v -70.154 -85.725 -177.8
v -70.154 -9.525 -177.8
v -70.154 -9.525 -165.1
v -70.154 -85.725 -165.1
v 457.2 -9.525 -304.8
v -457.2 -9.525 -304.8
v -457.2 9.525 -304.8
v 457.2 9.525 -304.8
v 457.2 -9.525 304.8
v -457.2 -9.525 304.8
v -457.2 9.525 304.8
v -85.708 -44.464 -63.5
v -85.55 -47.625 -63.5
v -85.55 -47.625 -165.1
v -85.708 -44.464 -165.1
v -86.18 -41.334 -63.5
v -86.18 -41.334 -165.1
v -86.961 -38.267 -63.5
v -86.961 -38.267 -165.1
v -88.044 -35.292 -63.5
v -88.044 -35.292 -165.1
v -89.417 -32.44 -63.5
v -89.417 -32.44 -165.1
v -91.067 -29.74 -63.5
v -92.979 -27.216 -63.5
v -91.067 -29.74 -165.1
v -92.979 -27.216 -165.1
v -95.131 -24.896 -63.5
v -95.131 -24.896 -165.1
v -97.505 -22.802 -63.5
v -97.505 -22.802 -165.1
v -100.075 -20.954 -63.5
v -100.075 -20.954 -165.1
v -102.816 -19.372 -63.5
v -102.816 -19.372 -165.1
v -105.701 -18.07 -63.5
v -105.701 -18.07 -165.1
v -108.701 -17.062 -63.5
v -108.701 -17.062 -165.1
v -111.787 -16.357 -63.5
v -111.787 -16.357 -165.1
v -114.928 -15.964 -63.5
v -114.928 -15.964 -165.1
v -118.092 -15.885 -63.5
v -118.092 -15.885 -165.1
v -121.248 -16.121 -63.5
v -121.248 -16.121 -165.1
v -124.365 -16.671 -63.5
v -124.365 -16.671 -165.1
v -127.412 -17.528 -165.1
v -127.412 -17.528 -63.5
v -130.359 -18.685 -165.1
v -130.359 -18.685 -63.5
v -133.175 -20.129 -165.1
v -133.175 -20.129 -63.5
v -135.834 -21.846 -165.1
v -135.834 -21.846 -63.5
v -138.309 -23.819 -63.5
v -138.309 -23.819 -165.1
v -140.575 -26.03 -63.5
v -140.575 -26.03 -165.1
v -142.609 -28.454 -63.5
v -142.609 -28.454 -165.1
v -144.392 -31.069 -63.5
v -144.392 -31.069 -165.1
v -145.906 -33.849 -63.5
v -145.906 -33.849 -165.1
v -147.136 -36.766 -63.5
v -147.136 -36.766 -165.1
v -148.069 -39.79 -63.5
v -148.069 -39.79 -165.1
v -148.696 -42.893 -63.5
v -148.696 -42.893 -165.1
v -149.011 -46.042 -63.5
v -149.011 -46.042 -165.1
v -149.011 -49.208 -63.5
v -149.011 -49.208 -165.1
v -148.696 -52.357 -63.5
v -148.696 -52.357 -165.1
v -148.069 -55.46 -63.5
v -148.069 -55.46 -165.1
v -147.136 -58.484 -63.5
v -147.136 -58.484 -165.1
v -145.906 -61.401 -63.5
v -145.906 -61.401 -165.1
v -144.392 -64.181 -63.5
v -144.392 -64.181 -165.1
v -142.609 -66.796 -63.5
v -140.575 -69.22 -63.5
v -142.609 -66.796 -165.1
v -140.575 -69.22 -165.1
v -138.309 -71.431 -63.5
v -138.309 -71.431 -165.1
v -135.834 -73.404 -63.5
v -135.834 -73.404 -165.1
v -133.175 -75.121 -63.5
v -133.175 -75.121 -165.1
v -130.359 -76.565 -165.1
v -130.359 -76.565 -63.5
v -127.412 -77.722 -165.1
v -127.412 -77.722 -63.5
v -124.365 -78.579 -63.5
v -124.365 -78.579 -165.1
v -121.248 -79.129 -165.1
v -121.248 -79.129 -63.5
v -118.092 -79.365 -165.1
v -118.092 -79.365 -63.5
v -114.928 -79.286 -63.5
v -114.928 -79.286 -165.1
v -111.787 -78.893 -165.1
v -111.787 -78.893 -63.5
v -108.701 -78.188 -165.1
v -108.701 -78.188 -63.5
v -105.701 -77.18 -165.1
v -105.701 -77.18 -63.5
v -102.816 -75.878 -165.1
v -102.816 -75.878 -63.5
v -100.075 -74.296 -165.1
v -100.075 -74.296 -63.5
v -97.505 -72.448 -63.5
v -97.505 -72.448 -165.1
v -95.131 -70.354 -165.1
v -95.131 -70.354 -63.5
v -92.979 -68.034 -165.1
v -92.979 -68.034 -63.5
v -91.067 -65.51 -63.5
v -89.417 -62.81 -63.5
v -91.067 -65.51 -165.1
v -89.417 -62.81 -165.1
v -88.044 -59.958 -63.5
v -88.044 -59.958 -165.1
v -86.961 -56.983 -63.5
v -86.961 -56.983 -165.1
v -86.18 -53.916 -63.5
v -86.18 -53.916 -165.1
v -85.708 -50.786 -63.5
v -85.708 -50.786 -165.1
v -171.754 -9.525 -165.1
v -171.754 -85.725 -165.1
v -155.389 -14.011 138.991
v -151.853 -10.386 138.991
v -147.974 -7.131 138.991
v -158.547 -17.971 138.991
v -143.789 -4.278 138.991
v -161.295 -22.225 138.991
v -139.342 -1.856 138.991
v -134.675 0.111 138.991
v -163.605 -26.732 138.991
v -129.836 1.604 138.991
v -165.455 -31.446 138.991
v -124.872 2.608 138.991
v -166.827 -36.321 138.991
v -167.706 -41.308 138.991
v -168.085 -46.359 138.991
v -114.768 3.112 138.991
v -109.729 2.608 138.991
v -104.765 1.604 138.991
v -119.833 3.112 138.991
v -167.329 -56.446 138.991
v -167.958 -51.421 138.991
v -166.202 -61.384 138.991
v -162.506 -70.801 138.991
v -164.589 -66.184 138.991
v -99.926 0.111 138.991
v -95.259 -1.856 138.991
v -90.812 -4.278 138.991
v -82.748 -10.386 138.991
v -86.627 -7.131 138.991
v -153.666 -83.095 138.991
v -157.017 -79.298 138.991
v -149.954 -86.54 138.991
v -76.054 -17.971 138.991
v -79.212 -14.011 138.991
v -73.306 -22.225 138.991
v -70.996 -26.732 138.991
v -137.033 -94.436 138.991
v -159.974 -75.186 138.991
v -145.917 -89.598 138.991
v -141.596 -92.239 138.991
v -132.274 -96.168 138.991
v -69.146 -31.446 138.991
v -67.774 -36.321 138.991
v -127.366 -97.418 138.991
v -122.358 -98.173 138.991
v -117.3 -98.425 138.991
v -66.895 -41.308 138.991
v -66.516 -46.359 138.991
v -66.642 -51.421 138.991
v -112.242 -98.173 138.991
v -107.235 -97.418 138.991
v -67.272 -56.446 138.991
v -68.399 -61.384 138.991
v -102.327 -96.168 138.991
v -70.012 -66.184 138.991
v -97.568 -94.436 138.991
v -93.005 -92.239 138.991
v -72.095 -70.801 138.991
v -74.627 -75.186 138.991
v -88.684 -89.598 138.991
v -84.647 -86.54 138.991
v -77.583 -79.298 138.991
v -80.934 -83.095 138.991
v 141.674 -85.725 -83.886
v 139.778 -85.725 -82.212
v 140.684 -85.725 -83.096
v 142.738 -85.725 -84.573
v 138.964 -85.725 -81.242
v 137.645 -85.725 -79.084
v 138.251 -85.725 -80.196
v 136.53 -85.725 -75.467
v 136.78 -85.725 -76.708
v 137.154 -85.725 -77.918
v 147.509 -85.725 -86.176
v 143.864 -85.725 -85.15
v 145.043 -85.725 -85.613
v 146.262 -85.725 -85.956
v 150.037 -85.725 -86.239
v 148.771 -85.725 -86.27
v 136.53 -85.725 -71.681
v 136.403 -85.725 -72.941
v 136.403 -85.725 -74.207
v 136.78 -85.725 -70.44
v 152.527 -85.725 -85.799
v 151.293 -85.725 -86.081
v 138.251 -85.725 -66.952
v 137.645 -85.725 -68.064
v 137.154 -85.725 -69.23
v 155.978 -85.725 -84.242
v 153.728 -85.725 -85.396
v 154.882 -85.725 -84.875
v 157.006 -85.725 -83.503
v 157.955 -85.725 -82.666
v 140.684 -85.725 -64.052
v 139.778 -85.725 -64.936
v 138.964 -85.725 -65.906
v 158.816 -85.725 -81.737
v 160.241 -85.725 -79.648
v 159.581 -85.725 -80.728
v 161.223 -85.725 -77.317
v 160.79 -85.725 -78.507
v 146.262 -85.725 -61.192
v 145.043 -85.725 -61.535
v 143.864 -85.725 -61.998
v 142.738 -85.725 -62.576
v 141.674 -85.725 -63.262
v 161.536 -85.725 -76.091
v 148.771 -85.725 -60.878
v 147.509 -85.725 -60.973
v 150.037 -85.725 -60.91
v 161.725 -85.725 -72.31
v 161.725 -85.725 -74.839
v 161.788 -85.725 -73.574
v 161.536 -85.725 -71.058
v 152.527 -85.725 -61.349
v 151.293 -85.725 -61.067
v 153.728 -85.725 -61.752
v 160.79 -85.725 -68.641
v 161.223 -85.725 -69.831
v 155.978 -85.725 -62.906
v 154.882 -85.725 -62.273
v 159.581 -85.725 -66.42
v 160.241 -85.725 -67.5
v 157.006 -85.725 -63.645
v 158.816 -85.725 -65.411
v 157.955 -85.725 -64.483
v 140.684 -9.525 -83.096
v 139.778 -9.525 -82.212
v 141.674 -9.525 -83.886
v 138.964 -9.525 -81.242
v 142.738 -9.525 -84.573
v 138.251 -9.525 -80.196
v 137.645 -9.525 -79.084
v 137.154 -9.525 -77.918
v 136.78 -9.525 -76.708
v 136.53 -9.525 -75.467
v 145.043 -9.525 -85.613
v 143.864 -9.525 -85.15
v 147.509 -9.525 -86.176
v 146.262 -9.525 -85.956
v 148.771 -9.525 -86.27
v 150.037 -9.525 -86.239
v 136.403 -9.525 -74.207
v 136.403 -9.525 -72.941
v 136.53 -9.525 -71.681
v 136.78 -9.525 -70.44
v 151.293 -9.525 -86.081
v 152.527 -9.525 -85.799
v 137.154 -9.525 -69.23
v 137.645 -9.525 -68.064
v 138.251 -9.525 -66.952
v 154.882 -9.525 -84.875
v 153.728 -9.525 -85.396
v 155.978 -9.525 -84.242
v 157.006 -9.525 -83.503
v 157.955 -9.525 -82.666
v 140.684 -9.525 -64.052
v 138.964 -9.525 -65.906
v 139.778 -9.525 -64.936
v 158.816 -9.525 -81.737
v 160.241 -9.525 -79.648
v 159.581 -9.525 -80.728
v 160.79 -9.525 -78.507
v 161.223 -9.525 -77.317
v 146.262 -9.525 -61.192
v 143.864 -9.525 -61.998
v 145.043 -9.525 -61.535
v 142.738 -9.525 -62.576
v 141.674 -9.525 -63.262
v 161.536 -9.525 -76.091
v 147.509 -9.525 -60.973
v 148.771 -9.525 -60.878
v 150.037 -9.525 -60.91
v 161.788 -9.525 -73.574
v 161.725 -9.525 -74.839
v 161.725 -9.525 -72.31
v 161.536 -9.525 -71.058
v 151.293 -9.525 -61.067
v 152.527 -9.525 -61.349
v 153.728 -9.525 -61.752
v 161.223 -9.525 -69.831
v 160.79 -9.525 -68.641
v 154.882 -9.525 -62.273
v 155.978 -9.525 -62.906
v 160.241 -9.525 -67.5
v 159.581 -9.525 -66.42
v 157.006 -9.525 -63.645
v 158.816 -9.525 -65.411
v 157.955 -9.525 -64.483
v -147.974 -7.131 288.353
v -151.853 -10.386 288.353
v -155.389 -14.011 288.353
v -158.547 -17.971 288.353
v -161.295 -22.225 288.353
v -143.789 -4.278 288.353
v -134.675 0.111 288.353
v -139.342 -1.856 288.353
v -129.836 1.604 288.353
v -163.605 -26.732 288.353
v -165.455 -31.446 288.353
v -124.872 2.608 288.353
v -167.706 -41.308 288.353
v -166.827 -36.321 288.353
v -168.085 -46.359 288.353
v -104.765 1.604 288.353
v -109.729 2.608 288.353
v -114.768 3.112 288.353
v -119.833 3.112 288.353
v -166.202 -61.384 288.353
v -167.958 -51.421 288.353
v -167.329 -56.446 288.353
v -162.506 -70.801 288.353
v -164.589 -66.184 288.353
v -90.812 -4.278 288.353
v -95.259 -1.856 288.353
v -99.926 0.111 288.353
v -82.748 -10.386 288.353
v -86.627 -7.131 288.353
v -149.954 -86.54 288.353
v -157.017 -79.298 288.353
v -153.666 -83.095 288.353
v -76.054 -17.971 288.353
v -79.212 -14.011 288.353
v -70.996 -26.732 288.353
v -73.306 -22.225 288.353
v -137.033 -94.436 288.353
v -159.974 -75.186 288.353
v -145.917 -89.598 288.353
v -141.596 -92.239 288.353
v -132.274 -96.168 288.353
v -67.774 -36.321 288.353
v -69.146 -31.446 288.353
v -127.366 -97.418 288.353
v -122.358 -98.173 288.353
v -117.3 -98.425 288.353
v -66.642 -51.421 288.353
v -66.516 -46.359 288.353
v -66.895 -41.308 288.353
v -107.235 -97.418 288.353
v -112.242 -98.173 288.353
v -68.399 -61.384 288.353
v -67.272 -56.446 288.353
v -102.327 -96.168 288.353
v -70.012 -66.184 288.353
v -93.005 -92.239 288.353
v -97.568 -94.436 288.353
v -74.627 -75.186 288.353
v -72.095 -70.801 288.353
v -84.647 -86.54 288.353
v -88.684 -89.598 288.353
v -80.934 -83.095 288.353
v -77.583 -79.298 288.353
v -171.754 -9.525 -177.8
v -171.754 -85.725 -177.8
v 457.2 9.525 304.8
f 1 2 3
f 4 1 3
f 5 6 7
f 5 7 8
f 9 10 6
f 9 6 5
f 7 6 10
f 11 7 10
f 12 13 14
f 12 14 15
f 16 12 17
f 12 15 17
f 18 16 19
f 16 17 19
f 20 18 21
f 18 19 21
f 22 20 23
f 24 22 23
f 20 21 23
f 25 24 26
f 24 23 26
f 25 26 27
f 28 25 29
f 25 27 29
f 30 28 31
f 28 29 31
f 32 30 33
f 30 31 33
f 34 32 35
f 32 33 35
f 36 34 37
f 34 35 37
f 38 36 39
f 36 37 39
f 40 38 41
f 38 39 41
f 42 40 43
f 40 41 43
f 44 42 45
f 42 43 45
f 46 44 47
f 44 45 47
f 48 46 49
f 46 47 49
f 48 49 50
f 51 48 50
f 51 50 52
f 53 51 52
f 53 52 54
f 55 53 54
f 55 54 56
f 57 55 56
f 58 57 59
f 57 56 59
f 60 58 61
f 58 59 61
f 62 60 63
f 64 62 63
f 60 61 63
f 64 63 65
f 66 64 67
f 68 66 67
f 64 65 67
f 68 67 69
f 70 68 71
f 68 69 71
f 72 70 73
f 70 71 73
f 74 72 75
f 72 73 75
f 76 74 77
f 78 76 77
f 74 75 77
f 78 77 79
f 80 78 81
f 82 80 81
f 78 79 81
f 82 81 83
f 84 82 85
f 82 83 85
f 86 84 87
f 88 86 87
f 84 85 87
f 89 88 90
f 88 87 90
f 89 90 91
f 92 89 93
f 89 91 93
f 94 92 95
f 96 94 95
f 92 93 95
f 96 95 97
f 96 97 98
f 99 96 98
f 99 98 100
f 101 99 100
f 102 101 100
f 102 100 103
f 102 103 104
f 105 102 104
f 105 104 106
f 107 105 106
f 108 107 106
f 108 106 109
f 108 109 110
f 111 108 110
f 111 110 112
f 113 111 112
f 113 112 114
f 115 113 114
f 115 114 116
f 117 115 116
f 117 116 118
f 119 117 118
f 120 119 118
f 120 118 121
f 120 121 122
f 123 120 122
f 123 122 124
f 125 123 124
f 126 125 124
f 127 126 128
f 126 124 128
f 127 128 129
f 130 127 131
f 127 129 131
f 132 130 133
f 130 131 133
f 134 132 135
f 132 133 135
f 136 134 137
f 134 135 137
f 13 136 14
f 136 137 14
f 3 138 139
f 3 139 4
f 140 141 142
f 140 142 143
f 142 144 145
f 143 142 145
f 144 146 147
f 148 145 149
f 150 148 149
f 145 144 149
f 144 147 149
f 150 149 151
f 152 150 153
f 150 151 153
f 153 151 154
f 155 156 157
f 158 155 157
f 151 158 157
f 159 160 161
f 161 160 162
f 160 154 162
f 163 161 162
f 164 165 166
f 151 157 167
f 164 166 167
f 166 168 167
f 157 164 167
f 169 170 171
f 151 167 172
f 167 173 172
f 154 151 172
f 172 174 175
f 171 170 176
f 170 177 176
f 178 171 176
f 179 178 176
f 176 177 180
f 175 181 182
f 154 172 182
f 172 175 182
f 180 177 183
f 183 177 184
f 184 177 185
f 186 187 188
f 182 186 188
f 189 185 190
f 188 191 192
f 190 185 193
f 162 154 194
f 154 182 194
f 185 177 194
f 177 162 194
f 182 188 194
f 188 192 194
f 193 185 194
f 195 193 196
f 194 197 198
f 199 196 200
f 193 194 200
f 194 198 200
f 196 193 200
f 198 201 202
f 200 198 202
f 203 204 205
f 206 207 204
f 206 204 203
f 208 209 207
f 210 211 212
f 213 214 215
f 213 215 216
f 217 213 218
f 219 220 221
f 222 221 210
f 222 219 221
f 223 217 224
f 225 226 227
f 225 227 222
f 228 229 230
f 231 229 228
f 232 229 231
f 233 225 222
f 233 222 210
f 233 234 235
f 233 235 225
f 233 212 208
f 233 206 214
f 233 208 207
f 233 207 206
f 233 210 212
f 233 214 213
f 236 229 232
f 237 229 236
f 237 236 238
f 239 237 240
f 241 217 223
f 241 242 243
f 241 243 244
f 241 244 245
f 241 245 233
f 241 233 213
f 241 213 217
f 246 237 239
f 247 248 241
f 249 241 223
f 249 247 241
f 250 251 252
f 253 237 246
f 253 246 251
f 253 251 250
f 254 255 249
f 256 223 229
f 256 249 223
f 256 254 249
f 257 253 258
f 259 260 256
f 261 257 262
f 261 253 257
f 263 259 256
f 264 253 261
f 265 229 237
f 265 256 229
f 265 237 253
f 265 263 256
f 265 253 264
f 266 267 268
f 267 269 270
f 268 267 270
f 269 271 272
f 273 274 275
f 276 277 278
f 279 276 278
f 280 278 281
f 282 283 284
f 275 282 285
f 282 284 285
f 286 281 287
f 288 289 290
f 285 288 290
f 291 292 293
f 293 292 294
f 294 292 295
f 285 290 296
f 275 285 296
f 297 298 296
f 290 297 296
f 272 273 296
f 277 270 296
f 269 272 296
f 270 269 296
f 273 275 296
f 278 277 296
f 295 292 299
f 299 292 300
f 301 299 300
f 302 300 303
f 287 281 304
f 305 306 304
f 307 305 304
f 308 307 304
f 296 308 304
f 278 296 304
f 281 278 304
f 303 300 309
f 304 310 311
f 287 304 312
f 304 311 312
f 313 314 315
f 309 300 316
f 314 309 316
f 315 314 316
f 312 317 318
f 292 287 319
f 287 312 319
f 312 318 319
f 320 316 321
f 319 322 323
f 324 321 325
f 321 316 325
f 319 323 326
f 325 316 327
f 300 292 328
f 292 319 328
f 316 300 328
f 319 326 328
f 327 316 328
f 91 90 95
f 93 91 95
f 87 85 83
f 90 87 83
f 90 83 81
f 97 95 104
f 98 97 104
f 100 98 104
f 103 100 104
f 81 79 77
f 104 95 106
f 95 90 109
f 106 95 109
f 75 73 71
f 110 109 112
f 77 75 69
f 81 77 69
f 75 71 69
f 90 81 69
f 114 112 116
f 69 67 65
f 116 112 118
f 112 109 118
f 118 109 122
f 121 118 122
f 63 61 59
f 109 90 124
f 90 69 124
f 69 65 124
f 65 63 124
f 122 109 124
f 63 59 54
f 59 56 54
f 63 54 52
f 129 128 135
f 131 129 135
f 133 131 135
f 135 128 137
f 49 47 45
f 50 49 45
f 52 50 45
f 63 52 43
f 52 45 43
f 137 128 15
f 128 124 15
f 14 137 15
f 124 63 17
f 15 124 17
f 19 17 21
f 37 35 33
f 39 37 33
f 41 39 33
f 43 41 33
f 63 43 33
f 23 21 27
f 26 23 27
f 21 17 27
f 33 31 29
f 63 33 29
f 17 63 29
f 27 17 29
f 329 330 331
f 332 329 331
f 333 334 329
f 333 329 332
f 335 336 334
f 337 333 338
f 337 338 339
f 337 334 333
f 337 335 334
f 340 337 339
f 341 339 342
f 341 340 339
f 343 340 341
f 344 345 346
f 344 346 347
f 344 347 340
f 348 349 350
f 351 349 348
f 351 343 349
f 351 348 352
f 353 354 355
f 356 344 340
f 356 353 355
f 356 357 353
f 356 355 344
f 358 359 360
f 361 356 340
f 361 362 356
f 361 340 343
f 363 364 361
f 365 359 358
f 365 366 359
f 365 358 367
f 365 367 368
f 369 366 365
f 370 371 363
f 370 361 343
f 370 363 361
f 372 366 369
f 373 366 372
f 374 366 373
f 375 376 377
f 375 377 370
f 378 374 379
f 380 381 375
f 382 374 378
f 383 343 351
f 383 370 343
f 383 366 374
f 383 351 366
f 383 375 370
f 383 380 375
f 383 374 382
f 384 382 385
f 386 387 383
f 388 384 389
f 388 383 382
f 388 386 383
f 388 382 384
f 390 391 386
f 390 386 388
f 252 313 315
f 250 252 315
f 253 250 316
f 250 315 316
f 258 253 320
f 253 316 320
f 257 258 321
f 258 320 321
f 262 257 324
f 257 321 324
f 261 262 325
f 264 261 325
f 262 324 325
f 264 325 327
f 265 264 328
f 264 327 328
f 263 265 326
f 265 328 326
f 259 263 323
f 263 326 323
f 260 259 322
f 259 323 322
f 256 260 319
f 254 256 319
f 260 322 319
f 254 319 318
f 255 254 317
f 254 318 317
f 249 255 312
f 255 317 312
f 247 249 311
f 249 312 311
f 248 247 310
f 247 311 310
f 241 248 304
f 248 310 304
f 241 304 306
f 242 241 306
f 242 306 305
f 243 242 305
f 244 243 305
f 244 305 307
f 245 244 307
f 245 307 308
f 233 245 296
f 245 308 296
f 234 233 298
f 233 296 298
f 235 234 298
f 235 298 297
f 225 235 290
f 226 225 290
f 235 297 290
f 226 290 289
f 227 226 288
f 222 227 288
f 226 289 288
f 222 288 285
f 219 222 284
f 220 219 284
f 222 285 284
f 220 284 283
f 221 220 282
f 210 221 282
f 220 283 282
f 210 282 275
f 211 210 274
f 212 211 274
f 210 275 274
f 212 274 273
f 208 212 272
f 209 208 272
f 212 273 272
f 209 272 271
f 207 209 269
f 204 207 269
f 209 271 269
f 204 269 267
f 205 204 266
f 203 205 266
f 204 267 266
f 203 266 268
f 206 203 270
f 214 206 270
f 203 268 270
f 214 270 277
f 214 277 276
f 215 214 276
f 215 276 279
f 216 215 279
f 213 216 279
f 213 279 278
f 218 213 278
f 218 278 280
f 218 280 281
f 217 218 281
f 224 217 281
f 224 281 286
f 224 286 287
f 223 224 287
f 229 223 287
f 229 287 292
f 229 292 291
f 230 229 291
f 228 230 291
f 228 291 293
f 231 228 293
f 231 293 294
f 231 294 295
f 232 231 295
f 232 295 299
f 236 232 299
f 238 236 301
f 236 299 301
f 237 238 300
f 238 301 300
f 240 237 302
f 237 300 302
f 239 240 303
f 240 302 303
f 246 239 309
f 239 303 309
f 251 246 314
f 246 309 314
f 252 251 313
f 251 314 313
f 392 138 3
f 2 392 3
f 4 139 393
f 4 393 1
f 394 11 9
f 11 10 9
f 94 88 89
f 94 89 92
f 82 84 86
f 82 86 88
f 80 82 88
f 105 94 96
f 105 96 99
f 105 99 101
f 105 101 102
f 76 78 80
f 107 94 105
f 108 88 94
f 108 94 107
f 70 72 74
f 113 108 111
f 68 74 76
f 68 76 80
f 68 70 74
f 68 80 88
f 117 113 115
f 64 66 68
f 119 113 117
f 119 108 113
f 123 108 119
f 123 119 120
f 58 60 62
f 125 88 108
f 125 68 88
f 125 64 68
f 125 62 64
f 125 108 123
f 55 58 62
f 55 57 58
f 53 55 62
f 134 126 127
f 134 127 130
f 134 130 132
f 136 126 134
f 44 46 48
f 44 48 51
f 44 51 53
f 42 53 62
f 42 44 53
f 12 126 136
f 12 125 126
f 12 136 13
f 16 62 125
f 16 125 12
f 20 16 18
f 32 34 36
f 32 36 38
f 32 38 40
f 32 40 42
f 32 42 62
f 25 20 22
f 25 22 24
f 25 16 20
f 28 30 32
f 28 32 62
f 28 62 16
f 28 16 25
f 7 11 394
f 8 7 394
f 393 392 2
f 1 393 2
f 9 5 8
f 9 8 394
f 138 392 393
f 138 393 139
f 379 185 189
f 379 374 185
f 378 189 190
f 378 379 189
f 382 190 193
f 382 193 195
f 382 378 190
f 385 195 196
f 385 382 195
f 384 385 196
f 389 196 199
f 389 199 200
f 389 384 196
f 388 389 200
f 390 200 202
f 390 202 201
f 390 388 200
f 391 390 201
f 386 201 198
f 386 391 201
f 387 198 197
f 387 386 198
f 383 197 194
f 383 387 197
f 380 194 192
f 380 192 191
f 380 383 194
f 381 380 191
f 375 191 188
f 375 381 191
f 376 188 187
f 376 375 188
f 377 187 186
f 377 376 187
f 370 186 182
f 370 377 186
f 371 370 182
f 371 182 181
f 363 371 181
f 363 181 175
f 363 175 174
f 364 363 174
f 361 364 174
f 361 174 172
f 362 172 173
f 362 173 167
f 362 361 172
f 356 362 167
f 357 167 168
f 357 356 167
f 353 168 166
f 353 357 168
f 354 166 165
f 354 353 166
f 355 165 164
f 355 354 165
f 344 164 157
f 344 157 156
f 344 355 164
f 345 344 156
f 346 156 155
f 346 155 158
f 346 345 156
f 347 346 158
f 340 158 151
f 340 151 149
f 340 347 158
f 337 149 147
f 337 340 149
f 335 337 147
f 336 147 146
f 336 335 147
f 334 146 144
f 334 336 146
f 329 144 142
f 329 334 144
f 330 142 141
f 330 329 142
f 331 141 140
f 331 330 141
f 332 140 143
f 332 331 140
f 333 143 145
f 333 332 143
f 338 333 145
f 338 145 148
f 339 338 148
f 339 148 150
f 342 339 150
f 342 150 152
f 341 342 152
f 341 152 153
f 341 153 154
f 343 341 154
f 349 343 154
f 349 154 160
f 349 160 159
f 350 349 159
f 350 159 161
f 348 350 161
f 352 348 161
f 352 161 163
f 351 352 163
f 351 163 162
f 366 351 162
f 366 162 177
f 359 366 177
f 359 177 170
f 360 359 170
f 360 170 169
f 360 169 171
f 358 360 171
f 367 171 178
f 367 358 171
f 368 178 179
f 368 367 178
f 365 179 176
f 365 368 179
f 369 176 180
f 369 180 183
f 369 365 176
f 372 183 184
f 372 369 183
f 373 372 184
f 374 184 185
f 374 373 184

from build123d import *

# Parameters (mm, degrees)
F0_W     = 914.4
F0_H     = 609.6
F1_DEPTH = 9.525
F2_W     = 101.6
F2_H     = 12.7
F3_DEPTH = 76.2
F4_R     = 31.75
F5_DEPTH = 101.6
F6_R     = 12.7
F7_DEPTH = 76.2
F10_W    = 50.8
F10_H    = 149.3618286225


with BuildPart() as f1:
    # F0 (on Front) → F1 (new body, symmetric)
    with BuildSketch(Plane.XZ):
        Rectangle(F0_W, F0_H)
    extrude(amount=F1_DEPTH, both=True)


with BuildPart() as f3:
    # F2 (on face) → F3 (new body)
    with BuildSketch(Plane.XZ.offset(9.525)):
        with Locations((-120.9537057757, -171.45)):
            Rectangle(F2_W, F2_H)
    extrude(amount=F3_DEPTH)


with BuildPart() as f5:
    # F4 (on face) → F5 (new body)
    with BuildSketch(Plane.XY.offset(-165.1)):
        with Locations((-117.3004359007, -47.625)):
            Circle(F4_R)
    extrude(amount=F5_DEPTH)


with BuildPart() as f7:
    # F6 (on face) → F7 (new body)
    with BuildSketch(Plane.XZ.offset(9.525)):
        with Locations((149.0877121687, -73.5740661621)):
            Circle(F6_R)
    extrude(amount=F7_DEPTH)


with BuildPart() as f11:
    # F10 (on plane+point) → F11 (revolve)
    with BuildSketch(Plane.YZ.offset(-117.3004359007)):
        with Locations((-73.025, 213.6716130443)):
            Rectangle(F10_W, F10_H)
    revolve(axis=Axis((-117.3004359007, -47.625, 112.4262636778), (0, 0, 1)))


solid = Compound([f1.part, f3.part, f5.part, f7.part, f11.part])
